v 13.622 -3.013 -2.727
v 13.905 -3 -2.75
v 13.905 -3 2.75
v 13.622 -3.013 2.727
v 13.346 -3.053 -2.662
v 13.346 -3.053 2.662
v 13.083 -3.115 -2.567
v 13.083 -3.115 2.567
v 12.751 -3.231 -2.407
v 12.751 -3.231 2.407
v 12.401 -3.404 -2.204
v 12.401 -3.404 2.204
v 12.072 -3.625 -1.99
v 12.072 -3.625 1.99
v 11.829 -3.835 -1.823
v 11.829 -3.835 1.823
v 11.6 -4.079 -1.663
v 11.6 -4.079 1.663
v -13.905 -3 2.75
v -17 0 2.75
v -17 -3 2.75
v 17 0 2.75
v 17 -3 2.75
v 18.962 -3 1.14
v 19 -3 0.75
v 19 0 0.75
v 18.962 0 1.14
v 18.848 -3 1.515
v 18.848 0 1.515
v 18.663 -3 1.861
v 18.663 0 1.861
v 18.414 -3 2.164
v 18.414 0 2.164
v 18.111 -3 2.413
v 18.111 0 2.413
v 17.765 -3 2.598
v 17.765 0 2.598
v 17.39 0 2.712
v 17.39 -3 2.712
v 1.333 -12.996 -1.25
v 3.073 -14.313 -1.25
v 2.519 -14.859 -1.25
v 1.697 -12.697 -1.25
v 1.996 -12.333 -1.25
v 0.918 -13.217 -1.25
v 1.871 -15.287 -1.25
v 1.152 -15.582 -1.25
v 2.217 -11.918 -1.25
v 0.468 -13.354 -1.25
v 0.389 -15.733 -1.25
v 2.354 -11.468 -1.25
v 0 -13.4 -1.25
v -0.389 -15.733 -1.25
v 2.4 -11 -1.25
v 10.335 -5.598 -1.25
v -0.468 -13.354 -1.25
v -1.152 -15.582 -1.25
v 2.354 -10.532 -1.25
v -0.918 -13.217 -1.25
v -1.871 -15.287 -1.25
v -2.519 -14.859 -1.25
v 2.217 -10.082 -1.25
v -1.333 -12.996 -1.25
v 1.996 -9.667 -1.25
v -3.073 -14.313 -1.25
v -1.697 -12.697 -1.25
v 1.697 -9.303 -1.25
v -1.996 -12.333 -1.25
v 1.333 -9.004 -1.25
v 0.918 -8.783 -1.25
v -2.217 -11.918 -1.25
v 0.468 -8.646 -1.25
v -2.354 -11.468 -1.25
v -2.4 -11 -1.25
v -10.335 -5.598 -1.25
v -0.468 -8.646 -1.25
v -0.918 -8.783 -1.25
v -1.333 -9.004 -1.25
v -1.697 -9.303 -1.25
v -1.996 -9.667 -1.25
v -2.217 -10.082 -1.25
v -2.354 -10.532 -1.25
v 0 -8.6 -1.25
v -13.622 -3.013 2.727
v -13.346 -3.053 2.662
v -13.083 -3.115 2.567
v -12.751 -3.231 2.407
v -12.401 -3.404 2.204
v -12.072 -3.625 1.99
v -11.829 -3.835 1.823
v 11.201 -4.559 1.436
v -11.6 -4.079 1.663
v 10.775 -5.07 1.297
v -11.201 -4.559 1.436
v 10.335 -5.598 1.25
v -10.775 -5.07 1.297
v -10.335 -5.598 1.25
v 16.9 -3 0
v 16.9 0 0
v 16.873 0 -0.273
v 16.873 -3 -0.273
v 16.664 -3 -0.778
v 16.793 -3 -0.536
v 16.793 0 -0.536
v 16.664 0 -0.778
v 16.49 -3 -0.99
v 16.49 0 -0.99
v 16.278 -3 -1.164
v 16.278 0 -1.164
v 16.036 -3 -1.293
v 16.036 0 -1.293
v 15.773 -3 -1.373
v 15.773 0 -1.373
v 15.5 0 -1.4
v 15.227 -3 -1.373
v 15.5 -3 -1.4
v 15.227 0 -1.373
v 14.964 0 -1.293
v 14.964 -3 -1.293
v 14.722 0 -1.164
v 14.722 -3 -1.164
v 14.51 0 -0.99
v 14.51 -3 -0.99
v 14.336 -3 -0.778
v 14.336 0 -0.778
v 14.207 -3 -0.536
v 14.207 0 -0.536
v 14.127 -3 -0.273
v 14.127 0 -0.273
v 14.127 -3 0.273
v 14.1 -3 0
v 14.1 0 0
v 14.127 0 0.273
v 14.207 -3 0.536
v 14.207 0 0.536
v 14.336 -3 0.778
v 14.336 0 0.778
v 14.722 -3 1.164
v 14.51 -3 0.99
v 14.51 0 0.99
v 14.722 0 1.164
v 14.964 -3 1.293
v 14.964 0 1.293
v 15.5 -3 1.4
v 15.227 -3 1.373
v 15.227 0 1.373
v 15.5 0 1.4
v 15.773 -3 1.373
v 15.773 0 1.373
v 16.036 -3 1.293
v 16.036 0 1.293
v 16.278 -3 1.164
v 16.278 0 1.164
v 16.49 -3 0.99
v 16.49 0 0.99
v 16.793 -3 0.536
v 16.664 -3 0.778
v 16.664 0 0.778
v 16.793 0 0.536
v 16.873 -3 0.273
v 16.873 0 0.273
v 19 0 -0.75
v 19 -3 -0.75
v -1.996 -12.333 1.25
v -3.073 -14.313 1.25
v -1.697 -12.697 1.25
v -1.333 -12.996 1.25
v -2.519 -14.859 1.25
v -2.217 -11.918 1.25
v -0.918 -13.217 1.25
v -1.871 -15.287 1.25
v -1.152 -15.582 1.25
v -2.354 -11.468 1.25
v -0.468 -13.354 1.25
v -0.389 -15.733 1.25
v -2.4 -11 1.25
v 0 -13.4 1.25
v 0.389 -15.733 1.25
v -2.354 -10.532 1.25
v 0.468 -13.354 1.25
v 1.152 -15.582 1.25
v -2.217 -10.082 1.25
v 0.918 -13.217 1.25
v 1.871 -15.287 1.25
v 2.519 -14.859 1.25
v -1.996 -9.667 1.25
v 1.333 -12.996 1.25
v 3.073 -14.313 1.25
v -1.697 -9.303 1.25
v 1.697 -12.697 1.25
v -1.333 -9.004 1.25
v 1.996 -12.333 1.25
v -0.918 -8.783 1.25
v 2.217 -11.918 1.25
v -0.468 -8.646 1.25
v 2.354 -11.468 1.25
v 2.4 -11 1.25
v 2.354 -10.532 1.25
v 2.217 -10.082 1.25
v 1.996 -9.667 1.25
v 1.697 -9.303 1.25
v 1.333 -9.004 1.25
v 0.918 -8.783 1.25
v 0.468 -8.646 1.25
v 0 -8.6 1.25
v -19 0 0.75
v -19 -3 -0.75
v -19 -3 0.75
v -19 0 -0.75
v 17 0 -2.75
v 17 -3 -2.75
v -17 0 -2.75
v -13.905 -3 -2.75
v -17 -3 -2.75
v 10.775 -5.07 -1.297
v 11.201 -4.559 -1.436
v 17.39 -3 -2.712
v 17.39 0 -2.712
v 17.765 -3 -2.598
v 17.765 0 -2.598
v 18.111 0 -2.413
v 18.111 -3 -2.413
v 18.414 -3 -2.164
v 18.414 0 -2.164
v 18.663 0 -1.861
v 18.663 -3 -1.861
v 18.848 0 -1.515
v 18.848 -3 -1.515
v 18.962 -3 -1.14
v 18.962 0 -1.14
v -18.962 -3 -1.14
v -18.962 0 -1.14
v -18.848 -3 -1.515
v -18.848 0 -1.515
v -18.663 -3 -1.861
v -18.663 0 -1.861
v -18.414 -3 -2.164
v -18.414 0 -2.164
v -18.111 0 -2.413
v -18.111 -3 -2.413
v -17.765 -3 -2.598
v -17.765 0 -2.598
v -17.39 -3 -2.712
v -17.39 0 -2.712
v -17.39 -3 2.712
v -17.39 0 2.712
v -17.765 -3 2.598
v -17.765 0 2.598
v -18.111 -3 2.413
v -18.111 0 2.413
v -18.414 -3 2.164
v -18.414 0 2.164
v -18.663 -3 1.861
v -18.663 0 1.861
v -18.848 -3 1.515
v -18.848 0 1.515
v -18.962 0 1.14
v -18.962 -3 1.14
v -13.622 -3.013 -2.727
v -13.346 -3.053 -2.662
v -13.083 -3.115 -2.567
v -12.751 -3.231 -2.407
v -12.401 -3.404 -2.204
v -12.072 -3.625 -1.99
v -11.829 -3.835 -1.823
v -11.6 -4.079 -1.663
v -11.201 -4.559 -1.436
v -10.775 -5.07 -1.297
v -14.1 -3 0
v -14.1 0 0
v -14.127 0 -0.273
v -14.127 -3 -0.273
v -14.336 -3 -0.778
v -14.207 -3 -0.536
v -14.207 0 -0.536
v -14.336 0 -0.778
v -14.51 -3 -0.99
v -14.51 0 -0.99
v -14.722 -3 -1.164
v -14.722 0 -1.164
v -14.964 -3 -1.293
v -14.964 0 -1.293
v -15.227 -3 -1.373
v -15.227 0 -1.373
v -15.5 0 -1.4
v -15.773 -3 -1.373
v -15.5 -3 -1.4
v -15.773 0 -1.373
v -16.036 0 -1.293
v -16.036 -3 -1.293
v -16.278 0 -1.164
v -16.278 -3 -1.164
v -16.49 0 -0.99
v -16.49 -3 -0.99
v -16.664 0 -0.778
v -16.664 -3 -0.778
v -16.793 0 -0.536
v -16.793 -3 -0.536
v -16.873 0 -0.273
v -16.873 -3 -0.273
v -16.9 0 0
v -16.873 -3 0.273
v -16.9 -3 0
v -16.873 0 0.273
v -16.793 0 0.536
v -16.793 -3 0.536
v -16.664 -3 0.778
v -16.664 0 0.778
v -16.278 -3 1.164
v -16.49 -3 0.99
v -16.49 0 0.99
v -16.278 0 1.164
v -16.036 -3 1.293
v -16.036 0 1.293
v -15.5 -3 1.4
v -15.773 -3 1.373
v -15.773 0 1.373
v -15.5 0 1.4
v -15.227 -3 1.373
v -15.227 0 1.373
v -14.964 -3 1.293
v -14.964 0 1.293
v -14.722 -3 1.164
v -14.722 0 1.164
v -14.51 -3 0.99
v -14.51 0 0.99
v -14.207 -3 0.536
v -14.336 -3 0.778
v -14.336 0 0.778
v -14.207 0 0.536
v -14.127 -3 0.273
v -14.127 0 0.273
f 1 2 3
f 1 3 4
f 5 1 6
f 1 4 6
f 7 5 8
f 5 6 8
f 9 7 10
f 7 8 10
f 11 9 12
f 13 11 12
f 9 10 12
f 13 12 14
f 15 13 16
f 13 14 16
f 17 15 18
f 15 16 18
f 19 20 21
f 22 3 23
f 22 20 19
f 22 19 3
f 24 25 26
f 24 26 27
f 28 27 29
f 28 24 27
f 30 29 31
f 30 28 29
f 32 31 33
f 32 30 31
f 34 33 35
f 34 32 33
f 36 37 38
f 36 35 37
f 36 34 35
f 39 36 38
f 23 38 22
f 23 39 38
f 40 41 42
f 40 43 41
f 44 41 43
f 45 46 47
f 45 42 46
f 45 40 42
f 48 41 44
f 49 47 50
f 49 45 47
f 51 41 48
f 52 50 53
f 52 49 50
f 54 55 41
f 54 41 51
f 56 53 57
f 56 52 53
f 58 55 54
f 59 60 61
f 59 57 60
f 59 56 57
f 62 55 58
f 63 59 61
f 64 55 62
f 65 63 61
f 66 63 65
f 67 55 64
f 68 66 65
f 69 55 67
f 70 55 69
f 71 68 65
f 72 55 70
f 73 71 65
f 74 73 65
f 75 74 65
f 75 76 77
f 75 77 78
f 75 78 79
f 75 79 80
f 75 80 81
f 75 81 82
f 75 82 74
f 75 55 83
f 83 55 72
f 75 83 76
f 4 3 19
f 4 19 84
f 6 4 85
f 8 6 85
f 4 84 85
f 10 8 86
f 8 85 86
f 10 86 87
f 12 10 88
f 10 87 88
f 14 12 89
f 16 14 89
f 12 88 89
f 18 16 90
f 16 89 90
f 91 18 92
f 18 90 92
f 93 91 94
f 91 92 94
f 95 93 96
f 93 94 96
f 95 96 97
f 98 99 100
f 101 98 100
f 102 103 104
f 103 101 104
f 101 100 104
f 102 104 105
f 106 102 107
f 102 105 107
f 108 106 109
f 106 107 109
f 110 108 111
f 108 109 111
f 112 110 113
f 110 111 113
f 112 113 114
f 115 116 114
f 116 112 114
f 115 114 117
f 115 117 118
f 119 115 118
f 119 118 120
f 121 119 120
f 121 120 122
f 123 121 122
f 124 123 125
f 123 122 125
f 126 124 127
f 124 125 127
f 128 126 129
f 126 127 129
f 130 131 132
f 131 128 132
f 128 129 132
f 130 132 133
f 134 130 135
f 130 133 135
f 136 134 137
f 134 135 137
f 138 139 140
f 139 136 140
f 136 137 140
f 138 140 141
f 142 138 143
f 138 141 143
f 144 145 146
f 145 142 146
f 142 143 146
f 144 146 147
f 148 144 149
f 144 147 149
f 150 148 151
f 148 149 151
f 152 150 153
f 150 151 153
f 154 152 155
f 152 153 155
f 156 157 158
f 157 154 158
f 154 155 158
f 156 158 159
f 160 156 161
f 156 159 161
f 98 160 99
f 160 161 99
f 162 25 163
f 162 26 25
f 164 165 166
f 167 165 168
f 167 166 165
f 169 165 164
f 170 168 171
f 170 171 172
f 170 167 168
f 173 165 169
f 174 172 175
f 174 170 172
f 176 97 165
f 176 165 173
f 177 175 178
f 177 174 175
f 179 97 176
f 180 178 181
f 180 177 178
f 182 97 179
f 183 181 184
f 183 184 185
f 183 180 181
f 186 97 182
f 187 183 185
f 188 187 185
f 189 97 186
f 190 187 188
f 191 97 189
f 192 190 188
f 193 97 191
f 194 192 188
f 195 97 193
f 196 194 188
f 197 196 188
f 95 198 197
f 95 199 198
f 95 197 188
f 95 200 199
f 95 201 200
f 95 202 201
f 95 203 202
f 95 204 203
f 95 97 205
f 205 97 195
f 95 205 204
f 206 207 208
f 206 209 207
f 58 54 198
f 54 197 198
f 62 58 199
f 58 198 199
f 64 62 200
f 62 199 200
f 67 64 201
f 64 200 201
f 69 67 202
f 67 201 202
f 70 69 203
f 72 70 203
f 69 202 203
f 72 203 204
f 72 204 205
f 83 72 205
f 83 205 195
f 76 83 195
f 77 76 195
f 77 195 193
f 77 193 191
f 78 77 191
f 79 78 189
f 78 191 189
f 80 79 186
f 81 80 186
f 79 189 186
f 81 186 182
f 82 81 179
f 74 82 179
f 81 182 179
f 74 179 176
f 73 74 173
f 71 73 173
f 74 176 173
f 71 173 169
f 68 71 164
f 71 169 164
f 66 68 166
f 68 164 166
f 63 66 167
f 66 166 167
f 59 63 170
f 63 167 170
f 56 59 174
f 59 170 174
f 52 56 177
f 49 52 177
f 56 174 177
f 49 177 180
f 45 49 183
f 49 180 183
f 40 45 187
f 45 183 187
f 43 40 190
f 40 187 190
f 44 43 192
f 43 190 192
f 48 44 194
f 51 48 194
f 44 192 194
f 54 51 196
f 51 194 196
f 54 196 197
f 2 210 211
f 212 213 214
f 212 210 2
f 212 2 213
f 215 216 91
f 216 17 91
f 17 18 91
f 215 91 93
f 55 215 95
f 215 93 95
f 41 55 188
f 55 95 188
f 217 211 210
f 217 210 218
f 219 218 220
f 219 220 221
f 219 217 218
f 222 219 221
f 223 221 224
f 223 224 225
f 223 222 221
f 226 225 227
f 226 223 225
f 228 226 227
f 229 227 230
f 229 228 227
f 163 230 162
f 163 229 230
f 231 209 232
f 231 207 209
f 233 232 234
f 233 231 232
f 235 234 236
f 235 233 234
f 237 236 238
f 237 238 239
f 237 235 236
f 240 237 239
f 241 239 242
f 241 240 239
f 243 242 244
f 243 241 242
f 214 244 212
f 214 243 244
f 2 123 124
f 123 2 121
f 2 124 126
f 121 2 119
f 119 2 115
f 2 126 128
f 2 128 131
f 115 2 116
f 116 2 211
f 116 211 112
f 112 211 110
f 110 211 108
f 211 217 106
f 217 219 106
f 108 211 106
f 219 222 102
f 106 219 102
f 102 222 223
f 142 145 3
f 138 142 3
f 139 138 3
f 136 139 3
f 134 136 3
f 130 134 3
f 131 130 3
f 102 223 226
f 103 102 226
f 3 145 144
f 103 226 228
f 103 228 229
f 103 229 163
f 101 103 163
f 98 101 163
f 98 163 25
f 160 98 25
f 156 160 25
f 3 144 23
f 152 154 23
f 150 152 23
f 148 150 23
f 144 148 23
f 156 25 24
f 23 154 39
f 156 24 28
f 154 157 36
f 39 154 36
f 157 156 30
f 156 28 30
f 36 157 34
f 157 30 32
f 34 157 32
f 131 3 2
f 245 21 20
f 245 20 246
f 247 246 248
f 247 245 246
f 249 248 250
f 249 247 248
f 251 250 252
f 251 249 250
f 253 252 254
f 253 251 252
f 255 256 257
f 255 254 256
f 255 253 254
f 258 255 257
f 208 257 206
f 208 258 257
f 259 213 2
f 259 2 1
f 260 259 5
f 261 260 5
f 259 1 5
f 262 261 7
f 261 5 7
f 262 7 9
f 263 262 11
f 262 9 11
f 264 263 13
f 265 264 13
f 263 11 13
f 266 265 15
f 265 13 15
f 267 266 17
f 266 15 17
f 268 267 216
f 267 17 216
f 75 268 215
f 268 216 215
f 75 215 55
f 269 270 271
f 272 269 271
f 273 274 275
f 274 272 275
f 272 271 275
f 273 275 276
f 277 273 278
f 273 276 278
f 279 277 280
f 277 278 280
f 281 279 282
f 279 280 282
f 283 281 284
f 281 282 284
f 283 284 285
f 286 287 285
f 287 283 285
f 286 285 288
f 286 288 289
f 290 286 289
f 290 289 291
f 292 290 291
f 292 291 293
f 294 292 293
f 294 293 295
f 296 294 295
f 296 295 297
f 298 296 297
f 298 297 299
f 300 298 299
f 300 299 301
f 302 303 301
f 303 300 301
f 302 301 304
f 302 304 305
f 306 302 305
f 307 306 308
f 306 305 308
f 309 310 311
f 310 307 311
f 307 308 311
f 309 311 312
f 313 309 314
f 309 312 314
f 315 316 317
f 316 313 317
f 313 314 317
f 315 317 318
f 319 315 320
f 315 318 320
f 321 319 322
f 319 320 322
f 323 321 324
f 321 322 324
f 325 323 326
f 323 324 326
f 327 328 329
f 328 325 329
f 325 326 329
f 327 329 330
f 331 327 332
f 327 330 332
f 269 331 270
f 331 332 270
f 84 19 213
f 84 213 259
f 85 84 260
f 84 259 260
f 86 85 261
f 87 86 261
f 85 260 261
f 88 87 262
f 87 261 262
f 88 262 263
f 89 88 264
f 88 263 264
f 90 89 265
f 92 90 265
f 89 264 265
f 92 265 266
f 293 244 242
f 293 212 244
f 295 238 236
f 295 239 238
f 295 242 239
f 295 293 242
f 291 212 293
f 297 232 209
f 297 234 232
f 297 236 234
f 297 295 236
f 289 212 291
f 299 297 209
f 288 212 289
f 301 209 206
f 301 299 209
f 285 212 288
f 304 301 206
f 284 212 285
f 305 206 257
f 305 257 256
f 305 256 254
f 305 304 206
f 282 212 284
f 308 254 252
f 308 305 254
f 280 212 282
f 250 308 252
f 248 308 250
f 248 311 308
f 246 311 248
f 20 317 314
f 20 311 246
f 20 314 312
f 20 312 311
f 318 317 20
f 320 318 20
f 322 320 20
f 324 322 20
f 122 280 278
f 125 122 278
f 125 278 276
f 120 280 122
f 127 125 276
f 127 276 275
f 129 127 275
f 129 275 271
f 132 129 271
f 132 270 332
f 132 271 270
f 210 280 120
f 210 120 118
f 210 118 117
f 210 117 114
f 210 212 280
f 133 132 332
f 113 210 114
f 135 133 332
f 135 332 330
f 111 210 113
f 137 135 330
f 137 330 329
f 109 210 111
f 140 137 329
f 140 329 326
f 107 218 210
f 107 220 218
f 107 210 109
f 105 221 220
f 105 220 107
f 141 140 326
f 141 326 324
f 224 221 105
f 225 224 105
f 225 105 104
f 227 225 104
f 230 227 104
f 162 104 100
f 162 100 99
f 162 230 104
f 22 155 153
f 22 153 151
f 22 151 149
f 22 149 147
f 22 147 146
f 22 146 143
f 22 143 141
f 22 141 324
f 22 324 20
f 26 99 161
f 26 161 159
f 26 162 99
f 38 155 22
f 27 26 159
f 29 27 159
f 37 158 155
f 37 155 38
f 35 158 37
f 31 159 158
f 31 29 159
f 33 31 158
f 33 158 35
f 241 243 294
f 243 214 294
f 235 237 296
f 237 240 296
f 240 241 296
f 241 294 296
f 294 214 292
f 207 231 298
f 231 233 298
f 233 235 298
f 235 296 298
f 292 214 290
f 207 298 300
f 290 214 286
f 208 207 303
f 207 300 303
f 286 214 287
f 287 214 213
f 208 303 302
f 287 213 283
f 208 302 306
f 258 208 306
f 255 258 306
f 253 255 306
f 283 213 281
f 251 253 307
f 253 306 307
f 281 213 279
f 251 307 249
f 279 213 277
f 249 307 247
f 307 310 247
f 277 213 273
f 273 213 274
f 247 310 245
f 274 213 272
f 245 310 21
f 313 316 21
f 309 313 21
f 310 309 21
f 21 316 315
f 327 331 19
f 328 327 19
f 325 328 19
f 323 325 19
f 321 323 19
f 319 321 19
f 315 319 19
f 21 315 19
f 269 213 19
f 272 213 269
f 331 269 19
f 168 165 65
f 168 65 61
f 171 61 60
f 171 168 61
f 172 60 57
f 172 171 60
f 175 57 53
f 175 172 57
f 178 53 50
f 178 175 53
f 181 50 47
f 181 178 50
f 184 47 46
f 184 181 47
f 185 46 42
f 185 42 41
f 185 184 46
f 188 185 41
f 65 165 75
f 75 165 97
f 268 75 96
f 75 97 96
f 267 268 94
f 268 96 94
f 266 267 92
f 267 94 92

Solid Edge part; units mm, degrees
sketch "Sketch1" plane through (0, 0, 0) normal (0, -1, 0) x (1, 0, 0)
  circle A0 centre (-15.5, 0) radius 1.4
  line L0 (-19, -2.75) -> (-19, 2.75)
  line L1 (-19, 2.75) -> (19, 2.75)
  line L2 (19, 2.75) -> (19, -2.75)
  line L3 (19, -2.75) -> (-19, -2.75)
  circle A1 centre (15.5, 0) radius 1.4
  dimension "D1" = 38
  dimension "D2" = 5.5
  dimension "D3" = 31
  dimension "D4" = 15.5
extrude "Protrusion1" add sketch "Sketch1" along normal blind 3
sketch "Sketch2" plane through (0, -3, 0) normal (0, -1, 0) x (1, 0, 0)
  line L0 (12.5, -1.25) -> (-12.5, -1.25)
  line L1 (-12.5, -1.25) -> (-12.5, 1.25)
  line L2 (-12.5, 1.25) -> (12.5, 1.25)
  line L3 (12.5, 1.25) -> (12.5, -1.25)
extrude "ExtrudedProtrusion_2" add sketch "Sketch2" along normal blind 15
sketch "Sketch3" plane through (0, -10.5, 1.25) normal (0, 0, 1) x (1, 0, 0)
  line L0 (-12.5, 7.5) -> (-3.0729, -3.8125)
  arc A0 (-3.0729, -3.8125) -> (3.0729, -3.8125) centre (0, -1.2518) ccw
  line L1 (3.0729, -3.8125) -> (12.5, 7.5)
  line L2 (12.5, -7.5) -> (12.5, 7.5)
  line L3 (-12.5, -7.5) -> (12.5, -7.5)
  line L4 (-12.5, -7.5) -> (-12.5, 7.5)
extrude "ExtrudedCutout_1" cut sketch "Sketch3" against normal blind 25.6069
sketch "Sketch4" plane through (0, -10.5, 1.25) normal (0, 0, 1) x (1, 0, 0)
  circle A0 centre (0, -0.5) radius 2.4
extrude "ExtrudedCutout_2" cut sketch "Sketch4" against normal blind 14.916
fillet "Round_1" radius 3 4 edges at (0, -3, 1.25) (0, -3, -1.25) (12.5, -3, 0) (-12.5, -3, 0)
fillet "Round_2" radius 2 4 edges at (-19, -1.5, 2.75) (-19, -1.5, -2.75) (19, -1.5, -2.75) (19, -1.5, 2.75)
properties material "PLA"
